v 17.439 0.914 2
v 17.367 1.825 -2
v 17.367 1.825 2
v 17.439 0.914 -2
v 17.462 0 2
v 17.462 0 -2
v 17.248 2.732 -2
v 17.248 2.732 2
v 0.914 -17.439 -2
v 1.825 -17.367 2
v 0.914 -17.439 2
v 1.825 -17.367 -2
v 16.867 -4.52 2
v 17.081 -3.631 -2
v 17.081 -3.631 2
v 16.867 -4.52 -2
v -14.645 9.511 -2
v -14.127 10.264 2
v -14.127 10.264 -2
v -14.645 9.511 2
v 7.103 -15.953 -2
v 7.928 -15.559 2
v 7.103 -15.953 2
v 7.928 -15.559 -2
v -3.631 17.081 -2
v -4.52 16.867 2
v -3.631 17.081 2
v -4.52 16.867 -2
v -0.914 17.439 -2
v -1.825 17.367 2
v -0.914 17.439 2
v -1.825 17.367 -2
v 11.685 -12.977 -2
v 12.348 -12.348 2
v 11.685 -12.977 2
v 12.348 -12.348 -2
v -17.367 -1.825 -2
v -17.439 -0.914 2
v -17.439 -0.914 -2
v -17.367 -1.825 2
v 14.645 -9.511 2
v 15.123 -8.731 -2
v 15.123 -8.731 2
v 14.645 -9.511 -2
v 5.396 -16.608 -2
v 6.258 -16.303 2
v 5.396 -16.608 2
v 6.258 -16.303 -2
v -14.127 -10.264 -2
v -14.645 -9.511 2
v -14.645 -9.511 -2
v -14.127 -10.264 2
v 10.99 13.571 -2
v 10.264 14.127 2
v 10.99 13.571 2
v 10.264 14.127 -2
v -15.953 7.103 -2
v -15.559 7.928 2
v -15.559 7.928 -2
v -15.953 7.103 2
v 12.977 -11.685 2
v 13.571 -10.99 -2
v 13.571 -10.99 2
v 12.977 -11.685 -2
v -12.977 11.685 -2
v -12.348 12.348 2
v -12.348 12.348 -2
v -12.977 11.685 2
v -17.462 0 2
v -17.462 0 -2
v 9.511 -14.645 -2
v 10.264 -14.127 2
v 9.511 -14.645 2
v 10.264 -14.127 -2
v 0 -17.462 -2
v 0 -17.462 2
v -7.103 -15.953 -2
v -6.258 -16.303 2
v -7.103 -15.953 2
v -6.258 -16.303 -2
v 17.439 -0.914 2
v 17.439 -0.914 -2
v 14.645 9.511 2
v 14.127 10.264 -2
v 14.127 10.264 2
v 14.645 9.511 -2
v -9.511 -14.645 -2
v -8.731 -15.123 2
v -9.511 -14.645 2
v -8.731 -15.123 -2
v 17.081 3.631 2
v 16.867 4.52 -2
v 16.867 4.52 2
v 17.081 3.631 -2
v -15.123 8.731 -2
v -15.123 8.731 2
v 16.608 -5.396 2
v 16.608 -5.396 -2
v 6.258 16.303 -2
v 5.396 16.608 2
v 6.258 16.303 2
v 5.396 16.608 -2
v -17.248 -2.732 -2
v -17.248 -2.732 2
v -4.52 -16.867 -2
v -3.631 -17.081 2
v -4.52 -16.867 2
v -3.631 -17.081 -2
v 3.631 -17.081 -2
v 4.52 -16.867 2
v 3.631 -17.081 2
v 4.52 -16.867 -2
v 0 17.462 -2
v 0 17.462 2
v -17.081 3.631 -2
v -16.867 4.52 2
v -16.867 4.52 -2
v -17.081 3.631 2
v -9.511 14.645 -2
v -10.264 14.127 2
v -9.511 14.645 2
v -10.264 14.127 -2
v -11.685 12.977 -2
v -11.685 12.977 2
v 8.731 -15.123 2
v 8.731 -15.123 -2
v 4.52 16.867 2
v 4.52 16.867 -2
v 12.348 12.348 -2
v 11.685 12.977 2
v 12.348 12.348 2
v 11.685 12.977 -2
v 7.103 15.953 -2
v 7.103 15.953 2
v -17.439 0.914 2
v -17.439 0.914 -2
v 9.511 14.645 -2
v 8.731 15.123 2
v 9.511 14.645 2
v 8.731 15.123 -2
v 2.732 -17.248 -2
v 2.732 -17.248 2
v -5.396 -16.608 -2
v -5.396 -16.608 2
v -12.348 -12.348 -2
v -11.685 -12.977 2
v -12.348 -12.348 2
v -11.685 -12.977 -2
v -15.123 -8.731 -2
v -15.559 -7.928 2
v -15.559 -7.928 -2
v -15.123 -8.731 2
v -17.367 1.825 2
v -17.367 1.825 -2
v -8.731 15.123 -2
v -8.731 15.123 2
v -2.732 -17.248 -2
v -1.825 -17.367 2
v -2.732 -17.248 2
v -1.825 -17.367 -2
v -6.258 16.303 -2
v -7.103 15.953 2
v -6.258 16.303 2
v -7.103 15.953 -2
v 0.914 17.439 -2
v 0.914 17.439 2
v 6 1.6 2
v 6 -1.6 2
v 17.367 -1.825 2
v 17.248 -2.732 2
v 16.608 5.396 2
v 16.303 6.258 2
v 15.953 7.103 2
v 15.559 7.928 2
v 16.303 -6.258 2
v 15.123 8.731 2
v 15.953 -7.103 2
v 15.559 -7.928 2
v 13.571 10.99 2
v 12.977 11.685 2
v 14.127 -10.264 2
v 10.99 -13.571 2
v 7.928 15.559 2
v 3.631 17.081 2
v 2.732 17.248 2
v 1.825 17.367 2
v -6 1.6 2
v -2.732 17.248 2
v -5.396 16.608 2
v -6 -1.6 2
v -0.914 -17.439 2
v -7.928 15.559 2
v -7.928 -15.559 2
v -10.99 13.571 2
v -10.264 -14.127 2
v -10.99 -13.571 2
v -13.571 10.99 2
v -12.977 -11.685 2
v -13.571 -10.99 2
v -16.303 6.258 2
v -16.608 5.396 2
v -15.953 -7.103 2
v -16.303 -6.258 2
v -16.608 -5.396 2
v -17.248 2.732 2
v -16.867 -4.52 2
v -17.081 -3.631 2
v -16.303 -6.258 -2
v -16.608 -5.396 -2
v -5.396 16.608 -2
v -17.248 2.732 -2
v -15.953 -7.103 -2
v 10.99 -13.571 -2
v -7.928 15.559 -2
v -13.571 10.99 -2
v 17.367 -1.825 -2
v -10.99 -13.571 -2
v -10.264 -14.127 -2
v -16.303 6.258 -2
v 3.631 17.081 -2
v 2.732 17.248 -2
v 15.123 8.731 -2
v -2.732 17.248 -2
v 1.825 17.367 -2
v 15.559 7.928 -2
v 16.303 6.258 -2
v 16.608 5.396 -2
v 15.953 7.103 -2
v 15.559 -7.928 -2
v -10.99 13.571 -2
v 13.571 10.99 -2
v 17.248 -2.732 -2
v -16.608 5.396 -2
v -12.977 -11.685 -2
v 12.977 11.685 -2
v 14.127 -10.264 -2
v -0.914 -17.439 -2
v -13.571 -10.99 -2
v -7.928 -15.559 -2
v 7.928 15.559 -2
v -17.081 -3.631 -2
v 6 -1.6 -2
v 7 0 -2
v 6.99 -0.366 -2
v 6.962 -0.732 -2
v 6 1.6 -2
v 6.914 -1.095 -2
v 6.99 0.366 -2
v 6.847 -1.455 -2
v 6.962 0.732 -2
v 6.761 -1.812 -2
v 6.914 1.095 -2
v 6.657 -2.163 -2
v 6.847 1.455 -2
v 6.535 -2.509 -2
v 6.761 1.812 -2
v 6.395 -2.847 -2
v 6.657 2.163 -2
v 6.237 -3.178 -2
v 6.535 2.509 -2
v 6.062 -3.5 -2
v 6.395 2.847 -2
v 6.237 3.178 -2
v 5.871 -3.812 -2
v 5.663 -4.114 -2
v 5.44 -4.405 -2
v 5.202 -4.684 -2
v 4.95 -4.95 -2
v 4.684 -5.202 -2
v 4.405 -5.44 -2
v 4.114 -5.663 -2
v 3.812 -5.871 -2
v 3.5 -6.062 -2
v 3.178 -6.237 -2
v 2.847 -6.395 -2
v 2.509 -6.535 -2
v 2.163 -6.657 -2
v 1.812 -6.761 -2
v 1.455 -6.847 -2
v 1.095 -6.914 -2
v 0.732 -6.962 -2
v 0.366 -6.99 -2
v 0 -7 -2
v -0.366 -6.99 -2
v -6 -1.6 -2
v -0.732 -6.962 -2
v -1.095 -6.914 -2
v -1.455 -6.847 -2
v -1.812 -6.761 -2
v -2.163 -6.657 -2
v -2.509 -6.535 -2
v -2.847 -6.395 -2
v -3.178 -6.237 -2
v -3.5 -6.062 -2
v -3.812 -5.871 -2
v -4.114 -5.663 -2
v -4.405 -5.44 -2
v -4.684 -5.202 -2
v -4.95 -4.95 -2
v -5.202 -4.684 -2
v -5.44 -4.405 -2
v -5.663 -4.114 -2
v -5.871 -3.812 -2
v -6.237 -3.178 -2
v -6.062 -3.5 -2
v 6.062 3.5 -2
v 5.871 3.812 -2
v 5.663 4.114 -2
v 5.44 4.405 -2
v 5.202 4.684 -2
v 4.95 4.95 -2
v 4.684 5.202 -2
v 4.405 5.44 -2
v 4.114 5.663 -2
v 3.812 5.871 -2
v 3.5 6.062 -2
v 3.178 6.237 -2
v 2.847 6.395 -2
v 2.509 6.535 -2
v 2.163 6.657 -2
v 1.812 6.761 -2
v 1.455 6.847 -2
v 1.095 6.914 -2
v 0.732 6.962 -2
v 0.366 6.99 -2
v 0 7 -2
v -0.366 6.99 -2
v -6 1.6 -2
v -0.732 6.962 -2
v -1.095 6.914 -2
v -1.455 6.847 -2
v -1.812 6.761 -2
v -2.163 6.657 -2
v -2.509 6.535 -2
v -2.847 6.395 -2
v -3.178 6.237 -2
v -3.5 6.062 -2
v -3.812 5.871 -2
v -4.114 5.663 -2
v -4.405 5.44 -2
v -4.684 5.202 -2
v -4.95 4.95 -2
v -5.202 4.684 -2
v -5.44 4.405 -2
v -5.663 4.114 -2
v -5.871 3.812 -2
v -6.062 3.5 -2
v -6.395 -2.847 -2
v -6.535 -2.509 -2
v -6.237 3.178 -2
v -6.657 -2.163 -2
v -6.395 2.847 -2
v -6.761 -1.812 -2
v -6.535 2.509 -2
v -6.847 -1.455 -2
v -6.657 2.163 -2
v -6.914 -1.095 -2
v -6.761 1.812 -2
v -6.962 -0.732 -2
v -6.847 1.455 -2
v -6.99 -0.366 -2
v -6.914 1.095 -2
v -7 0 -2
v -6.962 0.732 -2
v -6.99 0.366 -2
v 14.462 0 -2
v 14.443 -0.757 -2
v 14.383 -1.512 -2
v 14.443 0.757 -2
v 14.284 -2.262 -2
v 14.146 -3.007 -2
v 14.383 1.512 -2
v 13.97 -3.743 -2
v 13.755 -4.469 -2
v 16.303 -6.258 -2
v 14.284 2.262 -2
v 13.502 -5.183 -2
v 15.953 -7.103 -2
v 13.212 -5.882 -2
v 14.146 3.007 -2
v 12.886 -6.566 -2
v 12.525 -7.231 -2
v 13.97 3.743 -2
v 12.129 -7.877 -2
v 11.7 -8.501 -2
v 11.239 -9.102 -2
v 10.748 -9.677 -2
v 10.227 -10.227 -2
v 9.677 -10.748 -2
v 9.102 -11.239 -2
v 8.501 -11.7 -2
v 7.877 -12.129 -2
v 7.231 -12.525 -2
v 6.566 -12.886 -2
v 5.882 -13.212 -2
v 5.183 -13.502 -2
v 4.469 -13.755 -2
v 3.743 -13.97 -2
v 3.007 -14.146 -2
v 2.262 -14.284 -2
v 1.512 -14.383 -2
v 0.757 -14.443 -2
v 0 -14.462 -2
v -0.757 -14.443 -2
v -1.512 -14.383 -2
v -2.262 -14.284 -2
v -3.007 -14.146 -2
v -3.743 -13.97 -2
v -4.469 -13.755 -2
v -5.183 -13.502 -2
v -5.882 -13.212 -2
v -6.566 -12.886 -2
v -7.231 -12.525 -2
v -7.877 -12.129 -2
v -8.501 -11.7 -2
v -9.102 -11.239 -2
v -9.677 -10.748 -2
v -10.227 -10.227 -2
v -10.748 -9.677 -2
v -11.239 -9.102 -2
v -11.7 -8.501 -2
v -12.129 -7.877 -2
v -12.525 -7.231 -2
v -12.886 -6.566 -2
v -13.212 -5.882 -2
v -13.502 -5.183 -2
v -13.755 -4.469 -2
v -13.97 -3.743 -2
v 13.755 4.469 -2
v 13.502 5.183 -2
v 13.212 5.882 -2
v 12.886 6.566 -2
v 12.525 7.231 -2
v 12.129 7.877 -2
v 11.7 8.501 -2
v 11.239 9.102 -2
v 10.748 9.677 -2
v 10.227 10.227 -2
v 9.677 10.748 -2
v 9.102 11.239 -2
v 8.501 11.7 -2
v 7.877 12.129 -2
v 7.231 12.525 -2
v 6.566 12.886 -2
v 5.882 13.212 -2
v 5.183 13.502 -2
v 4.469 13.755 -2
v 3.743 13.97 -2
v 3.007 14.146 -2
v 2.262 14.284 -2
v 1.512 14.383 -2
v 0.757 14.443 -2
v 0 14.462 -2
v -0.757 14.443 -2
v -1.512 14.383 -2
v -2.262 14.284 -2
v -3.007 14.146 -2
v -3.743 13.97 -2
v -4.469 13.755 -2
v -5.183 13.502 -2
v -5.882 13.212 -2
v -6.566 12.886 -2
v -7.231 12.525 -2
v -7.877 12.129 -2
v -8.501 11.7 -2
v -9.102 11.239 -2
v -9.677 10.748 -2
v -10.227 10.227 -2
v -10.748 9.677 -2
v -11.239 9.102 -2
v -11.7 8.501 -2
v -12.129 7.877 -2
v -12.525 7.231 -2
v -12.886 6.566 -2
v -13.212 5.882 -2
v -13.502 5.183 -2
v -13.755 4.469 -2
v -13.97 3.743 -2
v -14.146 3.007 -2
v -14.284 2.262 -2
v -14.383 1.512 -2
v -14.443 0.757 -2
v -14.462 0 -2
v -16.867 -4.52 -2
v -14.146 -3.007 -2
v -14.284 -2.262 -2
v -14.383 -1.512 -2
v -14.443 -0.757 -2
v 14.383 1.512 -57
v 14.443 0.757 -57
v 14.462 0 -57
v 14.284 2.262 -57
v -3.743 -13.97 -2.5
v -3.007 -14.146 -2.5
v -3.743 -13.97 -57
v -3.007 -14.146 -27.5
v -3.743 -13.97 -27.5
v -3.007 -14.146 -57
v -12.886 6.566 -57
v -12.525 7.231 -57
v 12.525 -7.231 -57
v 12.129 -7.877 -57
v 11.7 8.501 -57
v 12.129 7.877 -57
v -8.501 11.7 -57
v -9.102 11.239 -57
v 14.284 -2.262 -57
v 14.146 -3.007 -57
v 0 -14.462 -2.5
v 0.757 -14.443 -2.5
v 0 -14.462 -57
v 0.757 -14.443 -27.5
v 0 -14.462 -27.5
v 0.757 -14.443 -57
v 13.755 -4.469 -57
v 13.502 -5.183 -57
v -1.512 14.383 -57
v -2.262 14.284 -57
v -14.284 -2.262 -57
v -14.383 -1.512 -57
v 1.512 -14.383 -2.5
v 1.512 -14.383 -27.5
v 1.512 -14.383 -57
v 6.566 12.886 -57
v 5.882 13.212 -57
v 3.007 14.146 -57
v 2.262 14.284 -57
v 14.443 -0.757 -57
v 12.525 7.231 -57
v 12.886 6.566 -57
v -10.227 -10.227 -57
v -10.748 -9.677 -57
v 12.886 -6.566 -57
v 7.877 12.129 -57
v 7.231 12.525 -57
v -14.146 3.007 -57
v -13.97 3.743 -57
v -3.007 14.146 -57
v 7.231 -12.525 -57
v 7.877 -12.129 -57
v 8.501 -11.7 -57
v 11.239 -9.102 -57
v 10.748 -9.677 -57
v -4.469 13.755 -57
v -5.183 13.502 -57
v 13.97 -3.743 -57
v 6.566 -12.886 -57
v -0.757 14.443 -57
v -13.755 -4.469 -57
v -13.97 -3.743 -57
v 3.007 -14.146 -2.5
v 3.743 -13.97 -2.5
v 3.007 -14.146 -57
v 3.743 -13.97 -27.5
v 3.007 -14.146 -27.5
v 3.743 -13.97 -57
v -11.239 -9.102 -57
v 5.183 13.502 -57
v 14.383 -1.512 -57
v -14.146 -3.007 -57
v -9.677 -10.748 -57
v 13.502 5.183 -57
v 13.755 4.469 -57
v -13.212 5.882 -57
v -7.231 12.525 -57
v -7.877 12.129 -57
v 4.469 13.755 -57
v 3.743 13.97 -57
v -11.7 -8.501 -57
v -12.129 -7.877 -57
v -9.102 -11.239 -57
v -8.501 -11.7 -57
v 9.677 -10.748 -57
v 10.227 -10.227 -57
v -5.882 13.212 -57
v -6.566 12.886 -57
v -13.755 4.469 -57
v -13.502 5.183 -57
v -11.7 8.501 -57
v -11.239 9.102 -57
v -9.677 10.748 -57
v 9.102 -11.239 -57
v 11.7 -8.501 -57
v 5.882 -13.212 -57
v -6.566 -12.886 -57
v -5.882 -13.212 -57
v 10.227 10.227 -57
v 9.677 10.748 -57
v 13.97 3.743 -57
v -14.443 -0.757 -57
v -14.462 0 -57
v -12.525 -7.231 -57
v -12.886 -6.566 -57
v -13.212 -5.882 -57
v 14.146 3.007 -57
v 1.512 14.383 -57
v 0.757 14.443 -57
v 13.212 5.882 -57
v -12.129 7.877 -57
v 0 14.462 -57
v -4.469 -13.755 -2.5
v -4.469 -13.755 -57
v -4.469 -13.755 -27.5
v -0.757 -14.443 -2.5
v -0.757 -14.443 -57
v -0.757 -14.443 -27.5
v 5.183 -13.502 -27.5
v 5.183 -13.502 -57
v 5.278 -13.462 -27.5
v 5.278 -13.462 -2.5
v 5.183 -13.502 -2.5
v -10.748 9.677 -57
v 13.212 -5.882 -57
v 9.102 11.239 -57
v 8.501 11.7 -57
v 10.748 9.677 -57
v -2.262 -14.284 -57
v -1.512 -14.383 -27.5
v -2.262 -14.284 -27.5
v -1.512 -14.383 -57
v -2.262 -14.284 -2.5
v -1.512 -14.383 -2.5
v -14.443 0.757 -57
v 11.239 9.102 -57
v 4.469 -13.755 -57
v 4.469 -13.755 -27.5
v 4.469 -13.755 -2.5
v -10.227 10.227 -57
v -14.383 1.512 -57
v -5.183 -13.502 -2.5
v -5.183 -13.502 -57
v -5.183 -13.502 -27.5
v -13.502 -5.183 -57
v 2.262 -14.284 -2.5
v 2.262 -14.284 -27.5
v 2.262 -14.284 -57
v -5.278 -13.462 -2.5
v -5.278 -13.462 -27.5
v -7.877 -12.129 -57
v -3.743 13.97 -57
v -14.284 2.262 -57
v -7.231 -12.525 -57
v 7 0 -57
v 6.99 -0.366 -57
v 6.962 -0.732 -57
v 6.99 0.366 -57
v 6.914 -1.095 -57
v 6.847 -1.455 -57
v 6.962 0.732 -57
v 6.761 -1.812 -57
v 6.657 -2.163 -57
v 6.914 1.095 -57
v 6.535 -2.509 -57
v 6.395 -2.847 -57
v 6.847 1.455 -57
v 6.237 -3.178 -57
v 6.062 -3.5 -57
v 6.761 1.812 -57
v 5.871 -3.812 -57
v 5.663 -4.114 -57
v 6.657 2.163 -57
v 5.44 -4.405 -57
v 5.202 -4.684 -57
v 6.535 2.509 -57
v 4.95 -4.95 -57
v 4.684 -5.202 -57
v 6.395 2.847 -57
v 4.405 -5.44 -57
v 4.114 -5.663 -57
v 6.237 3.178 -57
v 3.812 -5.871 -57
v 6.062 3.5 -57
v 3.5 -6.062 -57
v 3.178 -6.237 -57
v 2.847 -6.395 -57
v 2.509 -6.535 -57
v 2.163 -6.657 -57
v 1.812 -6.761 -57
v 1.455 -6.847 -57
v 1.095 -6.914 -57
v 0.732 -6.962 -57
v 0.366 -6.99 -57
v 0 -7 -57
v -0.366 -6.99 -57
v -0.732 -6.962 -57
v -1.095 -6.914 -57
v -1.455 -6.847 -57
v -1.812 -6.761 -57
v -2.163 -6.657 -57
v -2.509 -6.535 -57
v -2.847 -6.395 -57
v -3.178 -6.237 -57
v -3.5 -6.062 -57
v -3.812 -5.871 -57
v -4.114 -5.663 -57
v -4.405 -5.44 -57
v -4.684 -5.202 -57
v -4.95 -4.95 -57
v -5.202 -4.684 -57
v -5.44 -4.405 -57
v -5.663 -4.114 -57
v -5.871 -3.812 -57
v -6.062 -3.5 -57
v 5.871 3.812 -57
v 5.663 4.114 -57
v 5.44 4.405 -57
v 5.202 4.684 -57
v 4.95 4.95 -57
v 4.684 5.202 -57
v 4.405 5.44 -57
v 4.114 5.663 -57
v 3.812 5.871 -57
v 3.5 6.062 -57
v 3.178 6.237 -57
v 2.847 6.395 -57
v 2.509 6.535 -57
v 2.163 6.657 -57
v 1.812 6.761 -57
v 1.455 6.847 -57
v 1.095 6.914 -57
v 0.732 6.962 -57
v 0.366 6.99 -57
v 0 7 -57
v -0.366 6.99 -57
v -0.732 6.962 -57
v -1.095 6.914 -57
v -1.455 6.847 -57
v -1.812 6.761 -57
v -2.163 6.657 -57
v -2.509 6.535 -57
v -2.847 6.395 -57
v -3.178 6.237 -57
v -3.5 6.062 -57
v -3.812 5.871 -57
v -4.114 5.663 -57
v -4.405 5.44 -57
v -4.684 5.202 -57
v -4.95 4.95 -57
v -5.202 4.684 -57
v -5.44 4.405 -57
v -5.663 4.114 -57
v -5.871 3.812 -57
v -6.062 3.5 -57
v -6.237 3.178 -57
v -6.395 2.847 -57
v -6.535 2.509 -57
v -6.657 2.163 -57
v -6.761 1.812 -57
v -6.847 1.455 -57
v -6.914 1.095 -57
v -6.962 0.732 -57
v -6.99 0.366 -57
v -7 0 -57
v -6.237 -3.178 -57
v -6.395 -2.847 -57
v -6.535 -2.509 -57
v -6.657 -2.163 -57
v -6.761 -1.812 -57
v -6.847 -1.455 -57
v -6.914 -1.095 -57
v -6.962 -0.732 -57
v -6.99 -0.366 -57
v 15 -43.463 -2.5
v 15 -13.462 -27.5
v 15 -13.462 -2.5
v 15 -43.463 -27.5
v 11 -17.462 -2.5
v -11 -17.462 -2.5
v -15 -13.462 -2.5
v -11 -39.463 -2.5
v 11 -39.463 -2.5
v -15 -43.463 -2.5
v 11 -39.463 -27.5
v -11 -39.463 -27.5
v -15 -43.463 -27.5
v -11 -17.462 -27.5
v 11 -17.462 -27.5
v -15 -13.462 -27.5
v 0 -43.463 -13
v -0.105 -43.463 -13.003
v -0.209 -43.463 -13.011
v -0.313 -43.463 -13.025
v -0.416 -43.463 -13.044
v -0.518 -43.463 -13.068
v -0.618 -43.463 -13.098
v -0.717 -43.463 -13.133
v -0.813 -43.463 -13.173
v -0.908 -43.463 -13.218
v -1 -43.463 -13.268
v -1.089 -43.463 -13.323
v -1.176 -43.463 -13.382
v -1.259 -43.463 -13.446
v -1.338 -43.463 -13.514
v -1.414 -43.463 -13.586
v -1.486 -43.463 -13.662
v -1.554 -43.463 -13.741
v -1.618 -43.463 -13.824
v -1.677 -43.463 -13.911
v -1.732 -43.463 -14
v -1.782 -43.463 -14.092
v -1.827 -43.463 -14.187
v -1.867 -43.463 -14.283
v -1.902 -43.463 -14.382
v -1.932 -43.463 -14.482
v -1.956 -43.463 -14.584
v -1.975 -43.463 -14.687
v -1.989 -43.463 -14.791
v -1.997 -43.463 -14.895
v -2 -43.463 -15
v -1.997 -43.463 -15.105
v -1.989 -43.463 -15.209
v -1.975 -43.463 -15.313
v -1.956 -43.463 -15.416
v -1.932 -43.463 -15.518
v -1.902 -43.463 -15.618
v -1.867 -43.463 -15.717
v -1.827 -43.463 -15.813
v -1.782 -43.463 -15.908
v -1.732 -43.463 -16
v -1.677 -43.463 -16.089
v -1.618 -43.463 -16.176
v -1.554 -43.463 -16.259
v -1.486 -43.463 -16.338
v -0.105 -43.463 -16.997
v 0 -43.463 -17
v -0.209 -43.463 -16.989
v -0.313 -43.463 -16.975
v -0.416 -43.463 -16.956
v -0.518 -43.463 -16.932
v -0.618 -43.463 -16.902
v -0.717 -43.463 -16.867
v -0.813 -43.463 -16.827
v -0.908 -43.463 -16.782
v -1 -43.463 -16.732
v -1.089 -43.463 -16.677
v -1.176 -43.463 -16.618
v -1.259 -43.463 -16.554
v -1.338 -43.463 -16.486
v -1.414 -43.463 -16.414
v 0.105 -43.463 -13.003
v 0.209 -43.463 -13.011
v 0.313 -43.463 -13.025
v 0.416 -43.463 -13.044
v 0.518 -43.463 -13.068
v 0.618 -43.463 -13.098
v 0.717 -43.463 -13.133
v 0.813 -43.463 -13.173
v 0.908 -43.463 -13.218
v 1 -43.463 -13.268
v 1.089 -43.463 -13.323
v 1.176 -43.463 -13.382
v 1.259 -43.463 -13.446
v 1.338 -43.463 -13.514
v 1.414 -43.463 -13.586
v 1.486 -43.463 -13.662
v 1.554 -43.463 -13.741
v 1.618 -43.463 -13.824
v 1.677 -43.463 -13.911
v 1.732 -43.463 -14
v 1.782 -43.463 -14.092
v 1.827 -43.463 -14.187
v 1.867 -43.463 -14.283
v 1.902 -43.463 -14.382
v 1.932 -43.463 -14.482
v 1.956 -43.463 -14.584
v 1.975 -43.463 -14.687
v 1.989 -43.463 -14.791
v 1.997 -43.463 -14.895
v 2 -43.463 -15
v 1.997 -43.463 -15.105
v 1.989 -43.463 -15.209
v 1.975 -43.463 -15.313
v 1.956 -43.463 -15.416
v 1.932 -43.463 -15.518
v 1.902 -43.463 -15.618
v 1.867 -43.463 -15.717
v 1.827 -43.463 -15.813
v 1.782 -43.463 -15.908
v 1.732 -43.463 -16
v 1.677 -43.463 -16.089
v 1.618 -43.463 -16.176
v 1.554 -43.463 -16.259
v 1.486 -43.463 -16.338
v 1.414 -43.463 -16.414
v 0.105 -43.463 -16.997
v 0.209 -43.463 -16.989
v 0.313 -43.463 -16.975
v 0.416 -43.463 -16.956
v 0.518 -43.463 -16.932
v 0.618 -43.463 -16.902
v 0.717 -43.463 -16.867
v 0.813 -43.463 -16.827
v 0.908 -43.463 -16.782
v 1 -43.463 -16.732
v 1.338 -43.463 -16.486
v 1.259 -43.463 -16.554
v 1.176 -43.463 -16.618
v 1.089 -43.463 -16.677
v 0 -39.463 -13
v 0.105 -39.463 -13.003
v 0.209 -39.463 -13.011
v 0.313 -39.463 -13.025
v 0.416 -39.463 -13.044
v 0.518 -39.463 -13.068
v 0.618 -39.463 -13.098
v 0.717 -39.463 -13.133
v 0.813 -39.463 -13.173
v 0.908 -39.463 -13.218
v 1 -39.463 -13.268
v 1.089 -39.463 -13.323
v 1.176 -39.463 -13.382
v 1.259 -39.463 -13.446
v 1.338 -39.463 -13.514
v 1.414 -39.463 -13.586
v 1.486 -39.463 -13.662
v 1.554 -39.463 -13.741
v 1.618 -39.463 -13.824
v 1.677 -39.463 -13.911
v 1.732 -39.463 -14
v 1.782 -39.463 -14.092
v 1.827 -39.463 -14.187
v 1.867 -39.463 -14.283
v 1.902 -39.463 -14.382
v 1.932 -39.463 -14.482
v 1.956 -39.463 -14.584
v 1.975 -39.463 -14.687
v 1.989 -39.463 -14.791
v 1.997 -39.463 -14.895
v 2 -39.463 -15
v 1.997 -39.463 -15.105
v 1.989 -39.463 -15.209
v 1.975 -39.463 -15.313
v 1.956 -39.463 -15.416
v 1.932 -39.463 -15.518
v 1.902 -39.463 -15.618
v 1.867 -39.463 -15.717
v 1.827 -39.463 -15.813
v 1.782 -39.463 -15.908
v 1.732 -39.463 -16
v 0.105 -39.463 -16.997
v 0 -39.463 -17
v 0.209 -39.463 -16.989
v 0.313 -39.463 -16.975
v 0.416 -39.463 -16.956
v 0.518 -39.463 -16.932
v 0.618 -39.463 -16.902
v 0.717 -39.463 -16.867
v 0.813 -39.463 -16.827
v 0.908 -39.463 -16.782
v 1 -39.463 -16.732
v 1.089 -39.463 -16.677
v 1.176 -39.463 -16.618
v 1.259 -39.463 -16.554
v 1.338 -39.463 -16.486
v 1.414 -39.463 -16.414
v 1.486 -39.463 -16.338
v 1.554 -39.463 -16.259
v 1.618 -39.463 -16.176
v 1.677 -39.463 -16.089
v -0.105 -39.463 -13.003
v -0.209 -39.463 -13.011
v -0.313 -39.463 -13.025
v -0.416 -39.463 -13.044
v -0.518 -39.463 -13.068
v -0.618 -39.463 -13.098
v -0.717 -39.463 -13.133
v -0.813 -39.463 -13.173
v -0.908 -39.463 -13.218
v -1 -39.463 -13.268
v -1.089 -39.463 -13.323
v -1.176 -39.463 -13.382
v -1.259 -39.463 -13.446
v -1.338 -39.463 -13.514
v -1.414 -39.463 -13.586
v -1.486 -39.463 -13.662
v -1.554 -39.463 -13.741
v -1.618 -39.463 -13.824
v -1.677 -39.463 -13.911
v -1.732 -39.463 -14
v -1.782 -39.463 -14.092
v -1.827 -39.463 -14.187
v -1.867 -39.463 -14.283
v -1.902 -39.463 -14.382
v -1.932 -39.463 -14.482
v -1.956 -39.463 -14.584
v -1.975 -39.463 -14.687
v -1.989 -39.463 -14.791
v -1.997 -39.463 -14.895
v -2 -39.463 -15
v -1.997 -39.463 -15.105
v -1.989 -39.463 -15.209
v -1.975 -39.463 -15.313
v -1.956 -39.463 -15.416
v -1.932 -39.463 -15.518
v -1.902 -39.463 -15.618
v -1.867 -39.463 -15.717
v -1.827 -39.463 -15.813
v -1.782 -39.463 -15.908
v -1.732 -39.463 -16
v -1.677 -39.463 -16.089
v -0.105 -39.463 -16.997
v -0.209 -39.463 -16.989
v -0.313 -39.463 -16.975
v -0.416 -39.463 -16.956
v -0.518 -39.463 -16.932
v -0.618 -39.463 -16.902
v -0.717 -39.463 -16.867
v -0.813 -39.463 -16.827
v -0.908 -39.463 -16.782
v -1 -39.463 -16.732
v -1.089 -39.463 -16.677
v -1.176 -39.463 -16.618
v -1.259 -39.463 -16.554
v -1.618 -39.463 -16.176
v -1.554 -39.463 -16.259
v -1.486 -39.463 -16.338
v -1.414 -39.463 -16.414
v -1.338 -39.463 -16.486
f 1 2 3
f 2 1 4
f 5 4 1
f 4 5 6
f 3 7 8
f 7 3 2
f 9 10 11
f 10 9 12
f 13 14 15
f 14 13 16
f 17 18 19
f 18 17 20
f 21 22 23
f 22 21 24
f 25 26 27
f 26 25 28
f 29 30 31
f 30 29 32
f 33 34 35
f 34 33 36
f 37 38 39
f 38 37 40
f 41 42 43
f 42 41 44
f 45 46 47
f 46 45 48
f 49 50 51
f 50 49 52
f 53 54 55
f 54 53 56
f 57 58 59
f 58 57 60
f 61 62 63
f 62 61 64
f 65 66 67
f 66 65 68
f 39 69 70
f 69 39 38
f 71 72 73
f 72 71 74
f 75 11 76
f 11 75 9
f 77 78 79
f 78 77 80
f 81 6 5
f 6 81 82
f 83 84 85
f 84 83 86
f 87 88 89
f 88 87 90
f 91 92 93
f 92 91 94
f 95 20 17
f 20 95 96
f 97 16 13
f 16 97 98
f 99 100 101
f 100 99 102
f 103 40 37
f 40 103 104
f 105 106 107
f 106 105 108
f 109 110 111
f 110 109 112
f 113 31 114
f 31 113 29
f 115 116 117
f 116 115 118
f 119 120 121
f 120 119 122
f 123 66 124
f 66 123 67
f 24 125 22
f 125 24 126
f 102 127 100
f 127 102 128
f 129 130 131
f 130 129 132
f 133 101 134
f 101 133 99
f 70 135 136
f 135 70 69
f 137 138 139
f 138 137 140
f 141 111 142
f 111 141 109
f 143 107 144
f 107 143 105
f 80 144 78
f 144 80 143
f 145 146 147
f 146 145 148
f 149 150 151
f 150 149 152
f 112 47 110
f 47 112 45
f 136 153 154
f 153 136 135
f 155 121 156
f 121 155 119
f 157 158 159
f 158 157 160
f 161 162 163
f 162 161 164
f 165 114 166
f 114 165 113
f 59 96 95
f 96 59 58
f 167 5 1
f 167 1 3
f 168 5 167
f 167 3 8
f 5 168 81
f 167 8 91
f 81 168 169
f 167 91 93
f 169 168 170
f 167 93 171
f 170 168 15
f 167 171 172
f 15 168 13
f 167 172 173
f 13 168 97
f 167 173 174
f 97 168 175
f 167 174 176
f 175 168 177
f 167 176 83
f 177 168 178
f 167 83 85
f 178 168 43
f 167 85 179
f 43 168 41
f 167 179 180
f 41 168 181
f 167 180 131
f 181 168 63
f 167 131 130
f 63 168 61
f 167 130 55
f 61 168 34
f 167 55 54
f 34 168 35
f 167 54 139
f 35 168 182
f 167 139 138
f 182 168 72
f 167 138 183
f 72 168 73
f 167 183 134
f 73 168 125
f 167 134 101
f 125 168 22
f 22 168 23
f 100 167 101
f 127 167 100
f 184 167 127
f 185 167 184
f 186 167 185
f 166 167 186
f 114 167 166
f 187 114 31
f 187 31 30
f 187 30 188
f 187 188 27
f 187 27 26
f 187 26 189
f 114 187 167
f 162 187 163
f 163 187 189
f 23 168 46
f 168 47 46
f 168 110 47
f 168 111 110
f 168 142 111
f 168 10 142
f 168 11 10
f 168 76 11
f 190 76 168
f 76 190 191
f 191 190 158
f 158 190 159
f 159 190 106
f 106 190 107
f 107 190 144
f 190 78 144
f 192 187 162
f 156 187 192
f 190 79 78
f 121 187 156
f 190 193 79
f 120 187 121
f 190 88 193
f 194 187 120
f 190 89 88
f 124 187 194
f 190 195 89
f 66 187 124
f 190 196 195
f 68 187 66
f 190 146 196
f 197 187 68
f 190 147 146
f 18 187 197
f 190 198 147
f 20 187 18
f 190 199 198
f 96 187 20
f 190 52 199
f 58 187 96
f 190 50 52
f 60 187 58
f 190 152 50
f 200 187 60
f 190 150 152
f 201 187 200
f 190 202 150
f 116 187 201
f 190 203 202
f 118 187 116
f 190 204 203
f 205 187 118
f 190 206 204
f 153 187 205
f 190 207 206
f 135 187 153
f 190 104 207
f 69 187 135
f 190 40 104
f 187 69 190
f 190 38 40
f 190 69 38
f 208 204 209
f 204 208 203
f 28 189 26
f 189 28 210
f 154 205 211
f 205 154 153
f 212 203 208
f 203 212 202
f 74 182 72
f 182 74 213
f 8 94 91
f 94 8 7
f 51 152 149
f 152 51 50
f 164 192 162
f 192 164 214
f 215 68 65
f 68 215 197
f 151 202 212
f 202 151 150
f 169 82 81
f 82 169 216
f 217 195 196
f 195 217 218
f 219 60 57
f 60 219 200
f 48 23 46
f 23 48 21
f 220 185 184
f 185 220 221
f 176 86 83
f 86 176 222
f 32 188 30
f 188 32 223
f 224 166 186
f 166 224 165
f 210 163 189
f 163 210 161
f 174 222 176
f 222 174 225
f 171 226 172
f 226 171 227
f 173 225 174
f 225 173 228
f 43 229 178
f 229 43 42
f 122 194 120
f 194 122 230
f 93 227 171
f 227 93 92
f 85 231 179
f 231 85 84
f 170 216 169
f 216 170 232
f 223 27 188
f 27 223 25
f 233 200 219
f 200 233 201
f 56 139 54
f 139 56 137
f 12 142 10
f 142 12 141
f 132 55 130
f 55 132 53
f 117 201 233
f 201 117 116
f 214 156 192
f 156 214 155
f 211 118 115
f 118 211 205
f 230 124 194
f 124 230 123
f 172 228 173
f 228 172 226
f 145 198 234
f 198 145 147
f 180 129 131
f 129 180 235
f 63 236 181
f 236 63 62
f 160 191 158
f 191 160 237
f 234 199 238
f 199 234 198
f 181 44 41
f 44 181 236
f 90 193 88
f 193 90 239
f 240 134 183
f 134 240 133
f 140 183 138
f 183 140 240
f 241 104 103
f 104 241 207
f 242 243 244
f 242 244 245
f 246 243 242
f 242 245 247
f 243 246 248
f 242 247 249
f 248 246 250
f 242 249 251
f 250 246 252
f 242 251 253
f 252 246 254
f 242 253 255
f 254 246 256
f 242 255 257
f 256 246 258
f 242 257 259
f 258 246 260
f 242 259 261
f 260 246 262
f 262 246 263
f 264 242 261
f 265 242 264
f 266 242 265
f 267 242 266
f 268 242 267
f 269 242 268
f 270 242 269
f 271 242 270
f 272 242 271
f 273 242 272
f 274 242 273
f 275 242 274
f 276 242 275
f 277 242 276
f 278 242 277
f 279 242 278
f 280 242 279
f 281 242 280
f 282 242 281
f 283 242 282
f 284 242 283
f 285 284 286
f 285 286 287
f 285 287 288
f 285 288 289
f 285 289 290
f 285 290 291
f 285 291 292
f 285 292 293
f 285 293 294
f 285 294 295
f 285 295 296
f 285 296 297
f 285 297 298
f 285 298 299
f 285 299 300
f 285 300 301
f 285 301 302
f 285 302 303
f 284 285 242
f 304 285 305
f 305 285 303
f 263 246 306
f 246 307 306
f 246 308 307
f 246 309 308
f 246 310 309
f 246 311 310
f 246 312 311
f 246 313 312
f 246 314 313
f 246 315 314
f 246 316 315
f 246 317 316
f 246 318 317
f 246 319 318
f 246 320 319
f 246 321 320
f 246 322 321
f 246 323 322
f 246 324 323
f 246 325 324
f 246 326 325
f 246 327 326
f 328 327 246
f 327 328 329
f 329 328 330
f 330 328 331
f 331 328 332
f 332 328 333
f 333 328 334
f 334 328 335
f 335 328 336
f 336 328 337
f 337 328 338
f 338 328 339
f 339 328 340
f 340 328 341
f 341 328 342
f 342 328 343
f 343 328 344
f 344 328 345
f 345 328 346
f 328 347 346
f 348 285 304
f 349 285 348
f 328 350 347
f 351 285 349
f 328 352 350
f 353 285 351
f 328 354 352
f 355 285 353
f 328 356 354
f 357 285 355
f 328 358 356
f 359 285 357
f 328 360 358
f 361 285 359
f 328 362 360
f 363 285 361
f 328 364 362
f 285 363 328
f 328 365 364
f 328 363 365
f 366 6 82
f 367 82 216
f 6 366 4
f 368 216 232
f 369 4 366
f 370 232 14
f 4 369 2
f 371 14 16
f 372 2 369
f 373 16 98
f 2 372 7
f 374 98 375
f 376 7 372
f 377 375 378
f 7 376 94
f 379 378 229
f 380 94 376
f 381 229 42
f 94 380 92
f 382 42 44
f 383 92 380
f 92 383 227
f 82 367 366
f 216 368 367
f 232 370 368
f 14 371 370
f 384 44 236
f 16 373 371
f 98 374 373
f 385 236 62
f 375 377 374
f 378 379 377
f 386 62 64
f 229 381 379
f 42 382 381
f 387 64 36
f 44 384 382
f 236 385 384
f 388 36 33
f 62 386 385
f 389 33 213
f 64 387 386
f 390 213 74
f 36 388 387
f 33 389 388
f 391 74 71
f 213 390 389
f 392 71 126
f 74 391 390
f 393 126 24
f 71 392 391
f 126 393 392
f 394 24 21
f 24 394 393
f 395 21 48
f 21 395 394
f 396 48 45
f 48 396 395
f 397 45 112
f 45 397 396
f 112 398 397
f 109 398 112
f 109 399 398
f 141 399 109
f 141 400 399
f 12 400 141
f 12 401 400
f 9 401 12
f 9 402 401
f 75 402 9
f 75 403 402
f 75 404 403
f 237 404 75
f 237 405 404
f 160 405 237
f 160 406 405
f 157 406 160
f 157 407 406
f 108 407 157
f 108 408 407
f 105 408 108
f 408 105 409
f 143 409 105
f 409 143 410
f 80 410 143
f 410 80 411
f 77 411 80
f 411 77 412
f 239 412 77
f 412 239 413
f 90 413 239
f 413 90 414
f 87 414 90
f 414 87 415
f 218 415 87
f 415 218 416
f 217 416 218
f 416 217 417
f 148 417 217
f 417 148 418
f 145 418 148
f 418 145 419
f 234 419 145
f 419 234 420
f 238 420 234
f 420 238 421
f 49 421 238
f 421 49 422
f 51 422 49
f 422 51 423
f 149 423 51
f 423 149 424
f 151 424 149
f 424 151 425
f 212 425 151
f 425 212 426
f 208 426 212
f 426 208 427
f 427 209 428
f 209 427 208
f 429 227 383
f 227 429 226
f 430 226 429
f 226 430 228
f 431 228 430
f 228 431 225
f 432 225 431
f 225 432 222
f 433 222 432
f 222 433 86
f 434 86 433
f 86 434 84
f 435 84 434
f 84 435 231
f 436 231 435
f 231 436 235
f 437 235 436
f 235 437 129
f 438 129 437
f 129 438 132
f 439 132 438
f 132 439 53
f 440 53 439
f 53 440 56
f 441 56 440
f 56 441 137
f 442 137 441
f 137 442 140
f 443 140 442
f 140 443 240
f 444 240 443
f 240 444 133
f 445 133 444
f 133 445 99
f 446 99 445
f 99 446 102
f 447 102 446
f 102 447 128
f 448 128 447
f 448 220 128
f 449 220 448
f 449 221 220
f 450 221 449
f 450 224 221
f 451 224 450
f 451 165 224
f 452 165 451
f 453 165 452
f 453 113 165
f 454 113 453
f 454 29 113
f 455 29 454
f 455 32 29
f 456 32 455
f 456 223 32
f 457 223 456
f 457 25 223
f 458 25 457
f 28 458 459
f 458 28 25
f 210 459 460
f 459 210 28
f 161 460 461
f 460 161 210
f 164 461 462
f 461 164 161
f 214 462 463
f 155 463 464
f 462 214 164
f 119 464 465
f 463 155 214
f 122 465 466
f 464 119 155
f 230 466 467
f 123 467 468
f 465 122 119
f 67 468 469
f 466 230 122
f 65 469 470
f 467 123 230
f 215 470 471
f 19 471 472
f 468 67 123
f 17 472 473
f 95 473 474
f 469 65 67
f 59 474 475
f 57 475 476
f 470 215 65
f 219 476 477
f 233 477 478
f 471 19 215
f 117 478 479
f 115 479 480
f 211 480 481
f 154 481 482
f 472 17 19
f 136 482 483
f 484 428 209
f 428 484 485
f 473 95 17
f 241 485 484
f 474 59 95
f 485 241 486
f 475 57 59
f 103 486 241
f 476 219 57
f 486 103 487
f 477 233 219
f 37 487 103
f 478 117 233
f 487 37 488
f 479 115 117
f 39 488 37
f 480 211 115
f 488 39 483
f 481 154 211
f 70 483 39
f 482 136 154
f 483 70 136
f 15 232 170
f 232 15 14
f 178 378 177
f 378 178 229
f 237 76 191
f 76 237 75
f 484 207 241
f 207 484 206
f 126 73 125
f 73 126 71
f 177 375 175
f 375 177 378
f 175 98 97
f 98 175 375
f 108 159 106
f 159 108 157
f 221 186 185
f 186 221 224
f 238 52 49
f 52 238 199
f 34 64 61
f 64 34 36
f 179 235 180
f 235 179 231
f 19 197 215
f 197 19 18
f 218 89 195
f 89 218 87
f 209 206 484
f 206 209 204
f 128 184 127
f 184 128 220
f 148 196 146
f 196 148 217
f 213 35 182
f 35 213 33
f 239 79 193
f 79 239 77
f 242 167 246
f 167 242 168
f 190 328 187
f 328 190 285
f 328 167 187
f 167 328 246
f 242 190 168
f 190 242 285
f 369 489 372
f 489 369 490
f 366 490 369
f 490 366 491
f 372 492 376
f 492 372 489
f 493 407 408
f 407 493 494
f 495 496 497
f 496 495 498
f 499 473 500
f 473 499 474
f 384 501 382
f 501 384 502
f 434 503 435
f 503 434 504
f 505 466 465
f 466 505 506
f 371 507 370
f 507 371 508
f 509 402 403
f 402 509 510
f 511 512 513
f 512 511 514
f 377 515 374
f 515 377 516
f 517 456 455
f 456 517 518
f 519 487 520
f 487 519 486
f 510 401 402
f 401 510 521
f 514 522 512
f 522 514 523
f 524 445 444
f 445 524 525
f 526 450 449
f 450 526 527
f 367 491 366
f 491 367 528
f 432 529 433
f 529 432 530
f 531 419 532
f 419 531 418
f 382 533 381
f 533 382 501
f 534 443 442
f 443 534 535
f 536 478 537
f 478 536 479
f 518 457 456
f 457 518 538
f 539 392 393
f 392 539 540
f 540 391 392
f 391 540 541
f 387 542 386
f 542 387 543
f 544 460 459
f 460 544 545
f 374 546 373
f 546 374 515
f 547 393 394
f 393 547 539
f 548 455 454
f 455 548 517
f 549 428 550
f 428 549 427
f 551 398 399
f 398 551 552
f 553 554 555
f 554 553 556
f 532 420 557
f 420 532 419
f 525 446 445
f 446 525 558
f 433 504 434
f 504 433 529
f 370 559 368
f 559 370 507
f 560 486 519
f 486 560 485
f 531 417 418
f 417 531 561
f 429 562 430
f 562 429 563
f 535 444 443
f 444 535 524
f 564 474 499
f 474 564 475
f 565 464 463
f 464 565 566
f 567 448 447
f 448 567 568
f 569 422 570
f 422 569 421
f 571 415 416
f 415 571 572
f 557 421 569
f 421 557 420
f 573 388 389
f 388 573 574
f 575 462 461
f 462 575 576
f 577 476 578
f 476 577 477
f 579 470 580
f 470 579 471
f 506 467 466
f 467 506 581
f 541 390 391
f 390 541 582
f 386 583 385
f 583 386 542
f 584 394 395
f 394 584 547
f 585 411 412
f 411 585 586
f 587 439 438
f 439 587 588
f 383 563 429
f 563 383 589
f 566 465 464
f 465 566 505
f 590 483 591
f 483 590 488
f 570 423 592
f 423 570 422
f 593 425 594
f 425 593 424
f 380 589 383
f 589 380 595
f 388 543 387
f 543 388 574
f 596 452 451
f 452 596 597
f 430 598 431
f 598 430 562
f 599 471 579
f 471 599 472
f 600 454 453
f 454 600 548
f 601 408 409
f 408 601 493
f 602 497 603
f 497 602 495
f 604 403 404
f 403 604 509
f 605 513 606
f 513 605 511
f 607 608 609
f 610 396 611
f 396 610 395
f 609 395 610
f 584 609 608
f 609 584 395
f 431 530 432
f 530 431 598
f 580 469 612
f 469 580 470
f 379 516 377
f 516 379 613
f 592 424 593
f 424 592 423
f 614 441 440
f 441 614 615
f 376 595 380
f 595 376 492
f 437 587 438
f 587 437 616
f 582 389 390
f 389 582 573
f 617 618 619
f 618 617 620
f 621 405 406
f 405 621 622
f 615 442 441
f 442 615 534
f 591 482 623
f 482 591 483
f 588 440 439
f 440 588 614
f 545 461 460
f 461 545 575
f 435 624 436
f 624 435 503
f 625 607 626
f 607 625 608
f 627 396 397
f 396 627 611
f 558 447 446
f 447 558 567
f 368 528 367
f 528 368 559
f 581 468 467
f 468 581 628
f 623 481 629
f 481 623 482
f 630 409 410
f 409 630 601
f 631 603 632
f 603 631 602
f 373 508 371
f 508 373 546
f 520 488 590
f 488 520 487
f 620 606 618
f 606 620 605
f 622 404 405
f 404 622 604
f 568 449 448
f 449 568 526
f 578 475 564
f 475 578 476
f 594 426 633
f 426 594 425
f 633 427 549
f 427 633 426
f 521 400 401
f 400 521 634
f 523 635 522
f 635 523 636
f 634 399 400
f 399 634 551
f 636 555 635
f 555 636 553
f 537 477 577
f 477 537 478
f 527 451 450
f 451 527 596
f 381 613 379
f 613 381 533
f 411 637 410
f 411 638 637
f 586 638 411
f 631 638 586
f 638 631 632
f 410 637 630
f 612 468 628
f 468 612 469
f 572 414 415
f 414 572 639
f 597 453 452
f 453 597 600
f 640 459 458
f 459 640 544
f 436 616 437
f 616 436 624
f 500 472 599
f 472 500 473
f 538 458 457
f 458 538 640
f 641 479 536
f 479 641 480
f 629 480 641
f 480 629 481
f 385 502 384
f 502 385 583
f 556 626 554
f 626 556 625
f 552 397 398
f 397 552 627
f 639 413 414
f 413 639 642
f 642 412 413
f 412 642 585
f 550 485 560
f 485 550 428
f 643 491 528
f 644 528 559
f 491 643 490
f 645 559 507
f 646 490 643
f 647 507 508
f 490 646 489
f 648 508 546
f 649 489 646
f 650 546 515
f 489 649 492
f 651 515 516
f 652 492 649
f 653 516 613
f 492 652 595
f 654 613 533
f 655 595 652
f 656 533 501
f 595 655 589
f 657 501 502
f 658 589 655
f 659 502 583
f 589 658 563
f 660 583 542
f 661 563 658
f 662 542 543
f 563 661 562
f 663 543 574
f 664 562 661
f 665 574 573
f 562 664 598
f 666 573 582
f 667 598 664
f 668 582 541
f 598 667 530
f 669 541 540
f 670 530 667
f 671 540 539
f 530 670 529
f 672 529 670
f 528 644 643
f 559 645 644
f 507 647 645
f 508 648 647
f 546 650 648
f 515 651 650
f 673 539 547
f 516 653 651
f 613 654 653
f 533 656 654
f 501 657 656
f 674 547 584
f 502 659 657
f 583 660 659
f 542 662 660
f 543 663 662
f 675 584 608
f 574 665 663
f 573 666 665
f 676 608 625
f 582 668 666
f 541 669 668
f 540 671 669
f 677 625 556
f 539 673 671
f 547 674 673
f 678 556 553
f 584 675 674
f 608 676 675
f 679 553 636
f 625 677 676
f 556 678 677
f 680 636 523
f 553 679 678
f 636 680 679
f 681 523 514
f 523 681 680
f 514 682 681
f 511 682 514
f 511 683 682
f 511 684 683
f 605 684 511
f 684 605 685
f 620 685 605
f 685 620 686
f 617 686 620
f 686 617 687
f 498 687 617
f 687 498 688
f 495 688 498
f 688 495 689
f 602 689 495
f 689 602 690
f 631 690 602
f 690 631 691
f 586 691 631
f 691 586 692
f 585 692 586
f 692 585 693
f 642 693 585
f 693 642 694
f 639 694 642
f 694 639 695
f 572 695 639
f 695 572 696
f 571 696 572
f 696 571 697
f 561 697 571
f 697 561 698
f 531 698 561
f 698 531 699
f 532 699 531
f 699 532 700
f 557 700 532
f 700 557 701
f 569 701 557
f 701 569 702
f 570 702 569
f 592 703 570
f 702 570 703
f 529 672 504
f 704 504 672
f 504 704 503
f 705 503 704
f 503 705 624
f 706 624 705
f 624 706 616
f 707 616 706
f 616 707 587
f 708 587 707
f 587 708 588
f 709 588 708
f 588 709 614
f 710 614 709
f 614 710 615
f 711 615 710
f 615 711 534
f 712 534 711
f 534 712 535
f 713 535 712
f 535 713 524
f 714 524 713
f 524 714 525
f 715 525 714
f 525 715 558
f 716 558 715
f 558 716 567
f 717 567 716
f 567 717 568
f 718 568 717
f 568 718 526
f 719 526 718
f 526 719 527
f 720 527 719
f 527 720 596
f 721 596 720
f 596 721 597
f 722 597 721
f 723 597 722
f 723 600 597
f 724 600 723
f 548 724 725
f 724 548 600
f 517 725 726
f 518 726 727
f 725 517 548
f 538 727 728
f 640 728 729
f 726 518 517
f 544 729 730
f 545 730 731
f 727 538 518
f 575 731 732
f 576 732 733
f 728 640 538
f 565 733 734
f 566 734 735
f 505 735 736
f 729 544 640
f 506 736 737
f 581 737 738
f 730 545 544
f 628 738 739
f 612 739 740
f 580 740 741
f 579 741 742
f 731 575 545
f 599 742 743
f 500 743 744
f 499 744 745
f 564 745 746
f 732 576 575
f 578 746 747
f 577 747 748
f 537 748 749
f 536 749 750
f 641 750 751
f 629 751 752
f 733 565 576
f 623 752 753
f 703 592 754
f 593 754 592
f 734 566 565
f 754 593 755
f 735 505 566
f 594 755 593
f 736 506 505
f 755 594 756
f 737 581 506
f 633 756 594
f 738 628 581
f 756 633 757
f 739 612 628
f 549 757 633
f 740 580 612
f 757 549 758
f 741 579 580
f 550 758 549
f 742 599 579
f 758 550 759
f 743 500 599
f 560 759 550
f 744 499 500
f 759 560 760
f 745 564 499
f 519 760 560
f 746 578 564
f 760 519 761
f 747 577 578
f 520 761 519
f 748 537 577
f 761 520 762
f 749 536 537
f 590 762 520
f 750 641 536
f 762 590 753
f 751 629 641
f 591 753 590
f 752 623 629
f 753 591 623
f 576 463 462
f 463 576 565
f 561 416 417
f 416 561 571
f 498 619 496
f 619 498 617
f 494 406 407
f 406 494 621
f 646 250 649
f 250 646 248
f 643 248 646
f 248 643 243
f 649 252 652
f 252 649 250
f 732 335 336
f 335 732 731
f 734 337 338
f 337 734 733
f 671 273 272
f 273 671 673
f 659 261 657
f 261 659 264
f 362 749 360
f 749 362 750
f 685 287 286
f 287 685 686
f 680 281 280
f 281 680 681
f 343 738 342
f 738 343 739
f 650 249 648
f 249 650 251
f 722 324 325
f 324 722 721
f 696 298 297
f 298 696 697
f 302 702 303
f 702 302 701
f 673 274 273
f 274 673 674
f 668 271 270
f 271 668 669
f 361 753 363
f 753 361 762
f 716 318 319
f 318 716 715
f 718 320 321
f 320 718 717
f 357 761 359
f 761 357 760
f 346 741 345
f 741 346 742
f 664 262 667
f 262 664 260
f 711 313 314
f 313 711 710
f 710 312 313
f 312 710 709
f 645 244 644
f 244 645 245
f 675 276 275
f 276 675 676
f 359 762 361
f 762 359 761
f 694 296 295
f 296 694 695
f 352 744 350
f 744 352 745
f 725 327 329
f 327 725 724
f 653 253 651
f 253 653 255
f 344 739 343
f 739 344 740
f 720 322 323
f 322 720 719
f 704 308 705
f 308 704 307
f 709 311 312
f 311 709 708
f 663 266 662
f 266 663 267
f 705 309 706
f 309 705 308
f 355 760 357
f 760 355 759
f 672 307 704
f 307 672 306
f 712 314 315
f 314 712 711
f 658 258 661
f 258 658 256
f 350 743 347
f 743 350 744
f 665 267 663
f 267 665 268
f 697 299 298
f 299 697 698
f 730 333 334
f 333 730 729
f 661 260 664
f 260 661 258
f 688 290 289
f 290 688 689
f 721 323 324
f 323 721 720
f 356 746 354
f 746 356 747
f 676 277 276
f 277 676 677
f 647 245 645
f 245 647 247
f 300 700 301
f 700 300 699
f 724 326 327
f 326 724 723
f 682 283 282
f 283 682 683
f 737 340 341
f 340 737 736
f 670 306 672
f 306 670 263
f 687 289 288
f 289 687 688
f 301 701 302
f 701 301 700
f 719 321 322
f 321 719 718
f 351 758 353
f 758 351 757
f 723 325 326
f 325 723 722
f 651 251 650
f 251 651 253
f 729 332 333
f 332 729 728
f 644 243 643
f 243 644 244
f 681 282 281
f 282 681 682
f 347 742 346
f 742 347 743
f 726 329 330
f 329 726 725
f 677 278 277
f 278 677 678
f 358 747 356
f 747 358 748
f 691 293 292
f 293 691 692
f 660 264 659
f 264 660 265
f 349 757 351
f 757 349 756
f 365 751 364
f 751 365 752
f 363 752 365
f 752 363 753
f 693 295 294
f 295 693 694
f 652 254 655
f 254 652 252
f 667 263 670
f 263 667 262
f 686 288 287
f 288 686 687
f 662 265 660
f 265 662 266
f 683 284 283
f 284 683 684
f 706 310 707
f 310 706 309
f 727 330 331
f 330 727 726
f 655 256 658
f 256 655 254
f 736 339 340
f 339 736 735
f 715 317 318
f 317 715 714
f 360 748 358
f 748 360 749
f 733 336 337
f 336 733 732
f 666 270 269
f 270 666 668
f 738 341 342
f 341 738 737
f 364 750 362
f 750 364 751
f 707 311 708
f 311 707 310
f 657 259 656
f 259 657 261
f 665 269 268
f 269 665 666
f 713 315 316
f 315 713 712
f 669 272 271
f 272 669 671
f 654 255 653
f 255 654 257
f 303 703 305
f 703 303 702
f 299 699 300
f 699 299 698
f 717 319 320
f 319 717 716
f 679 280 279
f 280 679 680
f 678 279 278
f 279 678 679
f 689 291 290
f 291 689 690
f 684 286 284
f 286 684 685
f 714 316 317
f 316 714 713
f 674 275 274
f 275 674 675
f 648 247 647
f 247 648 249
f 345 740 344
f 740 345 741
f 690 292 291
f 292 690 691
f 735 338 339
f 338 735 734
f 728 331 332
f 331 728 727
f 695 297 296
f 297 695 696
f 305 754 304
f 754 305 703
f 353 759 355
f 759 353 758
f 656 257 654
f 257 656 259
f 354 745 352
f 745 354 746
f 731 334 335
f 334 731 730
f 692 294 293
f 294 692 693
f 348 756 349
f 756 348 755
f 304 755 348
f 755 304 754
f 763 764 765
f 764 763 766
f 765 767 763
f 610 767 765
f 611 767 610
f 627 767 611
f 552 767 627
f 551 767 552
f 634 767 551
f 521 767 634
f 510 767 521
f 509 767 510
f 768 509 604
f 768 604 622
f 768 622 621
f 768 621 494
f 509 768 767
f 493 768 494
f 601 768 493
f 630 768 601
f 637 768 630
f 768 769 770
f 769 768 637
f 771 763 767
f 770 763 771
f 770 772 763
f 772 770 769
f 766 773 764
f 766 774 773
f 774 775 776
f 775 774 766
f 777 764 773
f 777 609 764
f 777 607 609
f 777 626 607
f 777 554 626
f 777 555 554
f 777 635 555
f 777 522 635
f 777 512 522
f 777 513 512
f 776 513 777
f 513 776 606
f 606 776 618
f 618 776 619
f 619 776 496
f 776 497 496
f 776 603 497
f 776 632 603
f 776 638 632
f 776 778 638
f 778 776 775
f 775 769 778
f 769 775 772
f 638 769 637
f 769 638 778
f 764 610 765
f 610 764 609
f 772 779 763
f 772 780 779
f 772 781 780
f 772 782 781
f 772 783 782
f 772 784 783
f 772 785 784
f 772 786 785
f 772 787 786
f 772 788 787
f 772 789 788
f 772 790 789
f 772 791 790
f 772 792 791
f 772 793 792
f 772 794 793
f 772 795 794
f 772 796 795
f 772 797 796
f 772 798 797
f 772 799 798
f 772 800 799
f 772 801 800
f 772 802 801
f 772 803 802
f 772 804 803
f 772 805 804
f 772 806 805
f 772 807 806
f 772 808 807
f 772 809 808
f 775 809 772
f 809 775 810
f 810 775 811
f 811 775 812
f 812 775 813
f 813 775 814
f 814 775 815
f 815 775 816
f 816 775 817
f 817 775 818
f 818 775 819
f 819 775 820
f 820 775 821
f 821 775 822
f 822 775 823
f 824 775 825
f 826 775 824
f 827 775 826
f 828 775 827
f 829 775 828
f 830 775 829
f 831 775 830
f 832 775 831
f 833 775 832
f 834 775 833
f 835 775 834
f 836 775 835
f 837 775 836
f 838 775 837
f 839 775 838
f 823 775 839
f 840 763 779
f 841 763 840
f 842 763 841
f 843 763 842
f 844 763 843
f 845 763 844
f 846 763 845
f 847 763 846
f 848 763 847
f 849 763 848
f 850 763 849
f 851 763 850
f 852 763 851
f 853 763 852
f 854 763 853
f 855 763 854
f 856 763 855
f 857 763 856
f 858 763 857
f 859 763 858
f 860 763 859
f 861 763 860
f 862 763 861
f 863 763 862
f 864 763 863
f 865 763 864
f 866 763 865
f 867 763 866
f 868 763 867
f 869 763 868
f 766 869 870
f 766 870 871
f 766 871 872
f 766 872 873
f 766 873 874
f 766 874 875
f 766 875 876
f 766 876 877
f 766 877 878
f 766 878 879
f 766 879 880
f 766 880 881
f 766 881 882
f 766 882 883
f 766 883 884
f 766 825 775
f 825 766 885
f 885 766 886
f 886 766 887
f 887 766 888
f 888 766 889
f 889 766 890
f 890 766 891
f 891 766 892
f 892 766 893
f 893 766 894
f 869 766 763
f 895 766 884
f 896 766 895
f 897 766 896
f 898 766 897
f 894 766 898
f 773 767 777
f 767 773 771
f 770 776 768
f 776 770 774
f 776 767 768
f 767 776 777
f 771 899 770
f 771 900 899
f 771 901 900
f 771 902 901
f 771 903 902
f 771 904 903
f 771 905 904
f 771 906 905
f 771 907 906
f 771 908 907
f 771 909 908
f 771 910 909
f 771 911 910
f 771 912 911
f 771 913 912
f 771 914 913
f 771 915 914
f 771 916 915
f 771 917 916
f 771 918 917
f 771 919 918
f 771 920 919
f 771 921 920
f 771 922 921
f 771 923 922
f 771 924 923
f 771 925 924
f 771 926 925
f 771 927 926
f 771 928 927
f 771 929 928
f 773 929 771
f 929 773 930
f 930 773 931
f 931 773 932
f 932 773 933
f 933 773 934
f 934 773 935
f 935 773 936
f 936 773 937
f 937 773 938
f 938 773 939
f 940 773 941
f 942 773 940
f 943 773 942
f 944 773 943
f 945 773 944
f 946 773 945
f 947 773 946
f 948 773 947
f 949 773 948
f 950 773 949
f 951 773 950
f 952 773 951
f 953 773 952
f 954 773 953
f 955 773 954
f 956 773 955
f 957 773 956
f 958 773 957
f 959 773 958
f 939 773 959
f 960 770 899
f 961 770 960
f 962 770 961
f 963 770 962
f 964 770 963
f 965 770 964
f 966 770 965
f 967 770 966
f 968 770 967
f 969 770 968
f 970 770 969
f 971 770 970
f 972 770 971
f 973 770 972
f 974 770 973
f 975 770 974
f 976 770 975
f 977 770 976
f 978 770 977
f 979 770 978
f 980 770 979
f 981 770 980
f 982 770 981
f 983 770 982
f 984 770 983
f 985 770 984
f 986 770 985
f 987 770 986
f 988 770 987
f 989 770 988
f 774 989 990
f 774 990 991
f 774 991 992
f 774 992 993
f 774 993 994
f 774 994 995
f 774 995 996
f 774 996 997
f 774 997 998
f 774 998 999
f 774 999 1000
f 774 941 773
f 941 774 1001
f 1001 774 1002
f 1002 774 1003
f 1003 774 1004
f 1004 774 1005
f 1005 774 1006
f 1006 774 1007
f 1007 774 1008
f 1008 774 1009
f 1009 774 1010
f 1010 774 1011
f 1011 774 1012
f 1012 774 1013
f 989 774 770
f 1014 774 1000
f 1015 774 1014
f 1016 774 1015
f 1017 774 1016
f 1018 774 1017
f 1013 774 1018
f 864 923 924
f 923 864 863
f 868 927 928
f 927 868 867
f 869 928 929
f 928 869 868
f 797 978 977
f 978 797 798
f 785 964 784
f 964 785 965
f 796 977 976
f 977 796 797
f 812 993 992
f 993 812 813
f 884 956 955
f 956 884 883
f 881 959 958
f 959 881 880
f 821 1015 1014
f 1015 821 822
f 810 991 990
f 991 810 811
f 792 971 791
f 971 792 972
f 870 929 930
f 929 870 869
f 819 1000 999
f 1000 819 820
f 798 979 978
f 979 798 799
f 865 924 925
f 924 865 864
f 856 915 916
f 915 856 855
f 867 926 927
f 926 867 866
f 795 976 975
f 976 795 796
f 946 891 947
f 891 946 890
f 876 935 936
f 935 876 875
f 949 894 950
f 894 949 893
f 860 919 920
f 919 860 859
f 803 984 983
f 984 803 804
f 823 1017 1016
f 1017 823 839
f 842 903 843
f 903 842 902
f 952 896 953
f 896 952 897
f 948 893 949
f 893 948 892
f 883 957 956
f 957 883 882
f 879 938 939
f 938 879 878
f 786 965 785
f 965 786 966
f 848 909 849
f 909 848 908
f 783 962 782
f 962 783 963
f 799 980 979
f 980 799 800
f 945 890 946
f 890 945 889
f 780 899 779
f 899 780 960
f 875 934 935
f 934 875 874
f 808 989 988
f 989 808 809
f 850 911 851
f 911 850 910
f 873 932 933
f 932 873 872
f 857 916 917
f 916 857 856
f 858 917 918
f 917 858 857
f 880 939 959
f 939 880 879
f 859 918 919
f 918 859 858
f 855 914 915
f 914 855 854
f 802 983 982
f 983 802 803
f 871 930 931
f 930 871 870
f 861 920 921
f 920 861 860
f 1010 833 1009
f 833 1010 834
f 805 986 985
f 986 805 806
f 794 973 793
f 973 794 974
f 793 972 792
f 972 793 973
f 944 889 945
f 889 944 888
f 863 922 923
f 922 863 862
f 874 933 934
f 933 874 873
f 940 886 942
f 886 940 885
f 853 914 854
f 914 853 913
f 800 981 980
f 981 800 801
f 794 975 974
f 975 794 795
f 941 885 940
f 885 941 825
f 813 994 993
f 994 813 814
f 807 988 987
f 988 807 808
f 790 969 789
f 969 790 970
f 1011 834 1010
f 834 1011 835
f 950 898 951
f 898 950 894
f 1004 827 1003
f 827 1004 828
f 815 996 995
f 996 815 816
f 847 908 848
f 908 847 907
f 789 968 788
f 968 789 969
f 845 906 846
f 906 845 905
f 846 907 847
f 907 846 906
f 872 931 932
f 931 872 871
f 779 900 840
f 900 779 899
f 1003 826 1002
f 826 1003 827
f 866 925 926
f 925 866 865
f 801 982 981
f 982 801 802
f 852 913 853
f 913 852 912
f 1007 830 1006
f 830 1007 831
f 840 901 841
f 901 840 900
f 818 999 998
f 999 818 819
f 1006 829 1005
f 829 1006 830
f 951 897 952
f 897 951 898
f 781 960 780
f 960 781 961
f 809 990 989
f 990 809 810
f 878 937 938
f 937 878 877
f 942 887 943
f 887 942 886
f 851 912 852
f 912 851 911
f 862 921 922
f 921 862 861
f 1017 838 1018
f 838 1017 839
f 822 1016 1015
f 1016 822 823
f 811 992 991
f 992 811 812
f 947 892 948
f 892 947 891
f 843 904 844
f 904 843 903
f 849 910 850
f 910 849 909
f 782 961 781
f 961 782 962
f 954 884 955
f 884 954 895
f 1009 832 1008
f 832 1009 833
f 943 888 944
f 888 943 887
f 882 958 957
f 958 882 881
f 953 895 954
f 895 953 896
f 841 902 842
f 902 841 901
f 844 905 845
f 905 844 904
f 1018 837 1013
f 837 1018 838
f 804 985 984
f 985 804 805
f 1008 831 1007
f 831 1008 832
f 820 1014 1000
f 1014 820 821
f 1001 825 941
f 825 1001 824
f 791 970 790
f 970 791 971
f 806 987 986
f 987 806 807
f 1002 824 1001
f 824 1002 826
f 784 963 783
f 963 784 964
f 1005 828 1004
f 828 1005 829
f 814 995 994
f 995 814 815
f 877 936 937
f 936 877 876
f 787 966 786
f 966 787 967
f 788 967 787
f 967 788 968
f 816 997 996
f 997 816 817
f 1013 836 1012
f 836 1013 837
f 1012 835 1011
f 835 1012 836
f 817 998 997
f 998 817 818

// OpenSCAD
// ====================================================================================
// REVOLUTIONARY TECHNOLOGY COMPANY & UNIVERSITY OF WASHINGTON DEPARTMENT OF PHYSICS
// Subsystem: copo_ignition_tumbler.scad (Authentic 1969 Key Shroud with Sniffer Cavity)
// Core Application: Biometric Eye-Authentication & Alcohol Interlock Infrastructure
// Center Origin (0,0,0) = Geometric Centerpoint of the Key Entry Slot Face
// ====================================================================================

$fn = 120; // High-fidelity CNC laser-profiling and die-cast tooling path resolution

// --- 1969 Historical Geometric Constants (mm) ---
inch_to_mm         = 25.4;
bezel_outer_dia    = 1.375 * inch_to_mm; // 34.925 mm authentic chrome ignition face
tumbler_depth      = 55.00;              // Mechanical barrel length under steering cowl
keyway_slot_w      = 12.00;              // Fits original 1969 double-cut metal keys
keyway_slot_h      = 3.20;

// Solid-State Sensor Chamber Dimensions
sniffer_chamber_w  = 22.00;              // Cavity for semiconductor ethanol sniffer

module historical_chrome_ignition_face() {
    echo("COMPILING 1969 FACTORY BLUEPRINT IGNITION TUMBLER AND BIO INTERLOCKS");
    color("Chrome") { // Polished mirror accent ring profile
        difference() {
            // Front decorative face rim flange
            cylinder(d=bezel_outer_dia, h=4.0, center=true);
            // Center keyed entry pass-through slot
            cube([keyway_slot_w, keyway_slot_h, 6.0], center=true);
        }
    }
}

module mechanical_tumbler_barrel() {
    // Rigid rear cylinder container hosting the spring-rebound starter relays
    color("DimGrey") {
        translate([0, 0, -tumbler_depth/2 - 2]) {
            difference() {
                cylinder(d=bezel_outer_dia - 6, h=tumbler_depth, center=true);
                // Internal key path slide cylinder channel
                cylinder(d=keyway_slot_w + 2, h=tumbler_depth + 2, center=true);
            }
        }
    }
}

module ethanol_sniffer_cavity() {
    // Hidden auxiliary gas collection pocket machined directly under the bezel collar.
    // Draws cabin air across the driver's breath path to intercept trace organic vapors.
    color("DarkSlateGrey") {
        translate([0, -bezel_outer_dia/2 - sniffer_chamber_w/2, -15]) {
            difference() {
                cube([sniffer_chamber_w + 8, sniffer_chamber_w + 8, 25], center=true);
                cube([sniffer_chamber_w, sniffer_chamber_w, 27], center=true); // Sensor element box
                
                // Active micro-vent filtration openings drawing cabin air vectors
                translate([0, -sniffer_chamber_w/2, 0])
                    rotate([90, 0, 0]) cylinder(d=4.0, h=10, center=true);
            }
        }
    }
}

// --- Composite Mechanical Ignition Construction ---
union() {
    historical_chrome_ignition_face();
    mechanical_tumbler_barrel();
    ethanol_sniffer_cavity();
}
